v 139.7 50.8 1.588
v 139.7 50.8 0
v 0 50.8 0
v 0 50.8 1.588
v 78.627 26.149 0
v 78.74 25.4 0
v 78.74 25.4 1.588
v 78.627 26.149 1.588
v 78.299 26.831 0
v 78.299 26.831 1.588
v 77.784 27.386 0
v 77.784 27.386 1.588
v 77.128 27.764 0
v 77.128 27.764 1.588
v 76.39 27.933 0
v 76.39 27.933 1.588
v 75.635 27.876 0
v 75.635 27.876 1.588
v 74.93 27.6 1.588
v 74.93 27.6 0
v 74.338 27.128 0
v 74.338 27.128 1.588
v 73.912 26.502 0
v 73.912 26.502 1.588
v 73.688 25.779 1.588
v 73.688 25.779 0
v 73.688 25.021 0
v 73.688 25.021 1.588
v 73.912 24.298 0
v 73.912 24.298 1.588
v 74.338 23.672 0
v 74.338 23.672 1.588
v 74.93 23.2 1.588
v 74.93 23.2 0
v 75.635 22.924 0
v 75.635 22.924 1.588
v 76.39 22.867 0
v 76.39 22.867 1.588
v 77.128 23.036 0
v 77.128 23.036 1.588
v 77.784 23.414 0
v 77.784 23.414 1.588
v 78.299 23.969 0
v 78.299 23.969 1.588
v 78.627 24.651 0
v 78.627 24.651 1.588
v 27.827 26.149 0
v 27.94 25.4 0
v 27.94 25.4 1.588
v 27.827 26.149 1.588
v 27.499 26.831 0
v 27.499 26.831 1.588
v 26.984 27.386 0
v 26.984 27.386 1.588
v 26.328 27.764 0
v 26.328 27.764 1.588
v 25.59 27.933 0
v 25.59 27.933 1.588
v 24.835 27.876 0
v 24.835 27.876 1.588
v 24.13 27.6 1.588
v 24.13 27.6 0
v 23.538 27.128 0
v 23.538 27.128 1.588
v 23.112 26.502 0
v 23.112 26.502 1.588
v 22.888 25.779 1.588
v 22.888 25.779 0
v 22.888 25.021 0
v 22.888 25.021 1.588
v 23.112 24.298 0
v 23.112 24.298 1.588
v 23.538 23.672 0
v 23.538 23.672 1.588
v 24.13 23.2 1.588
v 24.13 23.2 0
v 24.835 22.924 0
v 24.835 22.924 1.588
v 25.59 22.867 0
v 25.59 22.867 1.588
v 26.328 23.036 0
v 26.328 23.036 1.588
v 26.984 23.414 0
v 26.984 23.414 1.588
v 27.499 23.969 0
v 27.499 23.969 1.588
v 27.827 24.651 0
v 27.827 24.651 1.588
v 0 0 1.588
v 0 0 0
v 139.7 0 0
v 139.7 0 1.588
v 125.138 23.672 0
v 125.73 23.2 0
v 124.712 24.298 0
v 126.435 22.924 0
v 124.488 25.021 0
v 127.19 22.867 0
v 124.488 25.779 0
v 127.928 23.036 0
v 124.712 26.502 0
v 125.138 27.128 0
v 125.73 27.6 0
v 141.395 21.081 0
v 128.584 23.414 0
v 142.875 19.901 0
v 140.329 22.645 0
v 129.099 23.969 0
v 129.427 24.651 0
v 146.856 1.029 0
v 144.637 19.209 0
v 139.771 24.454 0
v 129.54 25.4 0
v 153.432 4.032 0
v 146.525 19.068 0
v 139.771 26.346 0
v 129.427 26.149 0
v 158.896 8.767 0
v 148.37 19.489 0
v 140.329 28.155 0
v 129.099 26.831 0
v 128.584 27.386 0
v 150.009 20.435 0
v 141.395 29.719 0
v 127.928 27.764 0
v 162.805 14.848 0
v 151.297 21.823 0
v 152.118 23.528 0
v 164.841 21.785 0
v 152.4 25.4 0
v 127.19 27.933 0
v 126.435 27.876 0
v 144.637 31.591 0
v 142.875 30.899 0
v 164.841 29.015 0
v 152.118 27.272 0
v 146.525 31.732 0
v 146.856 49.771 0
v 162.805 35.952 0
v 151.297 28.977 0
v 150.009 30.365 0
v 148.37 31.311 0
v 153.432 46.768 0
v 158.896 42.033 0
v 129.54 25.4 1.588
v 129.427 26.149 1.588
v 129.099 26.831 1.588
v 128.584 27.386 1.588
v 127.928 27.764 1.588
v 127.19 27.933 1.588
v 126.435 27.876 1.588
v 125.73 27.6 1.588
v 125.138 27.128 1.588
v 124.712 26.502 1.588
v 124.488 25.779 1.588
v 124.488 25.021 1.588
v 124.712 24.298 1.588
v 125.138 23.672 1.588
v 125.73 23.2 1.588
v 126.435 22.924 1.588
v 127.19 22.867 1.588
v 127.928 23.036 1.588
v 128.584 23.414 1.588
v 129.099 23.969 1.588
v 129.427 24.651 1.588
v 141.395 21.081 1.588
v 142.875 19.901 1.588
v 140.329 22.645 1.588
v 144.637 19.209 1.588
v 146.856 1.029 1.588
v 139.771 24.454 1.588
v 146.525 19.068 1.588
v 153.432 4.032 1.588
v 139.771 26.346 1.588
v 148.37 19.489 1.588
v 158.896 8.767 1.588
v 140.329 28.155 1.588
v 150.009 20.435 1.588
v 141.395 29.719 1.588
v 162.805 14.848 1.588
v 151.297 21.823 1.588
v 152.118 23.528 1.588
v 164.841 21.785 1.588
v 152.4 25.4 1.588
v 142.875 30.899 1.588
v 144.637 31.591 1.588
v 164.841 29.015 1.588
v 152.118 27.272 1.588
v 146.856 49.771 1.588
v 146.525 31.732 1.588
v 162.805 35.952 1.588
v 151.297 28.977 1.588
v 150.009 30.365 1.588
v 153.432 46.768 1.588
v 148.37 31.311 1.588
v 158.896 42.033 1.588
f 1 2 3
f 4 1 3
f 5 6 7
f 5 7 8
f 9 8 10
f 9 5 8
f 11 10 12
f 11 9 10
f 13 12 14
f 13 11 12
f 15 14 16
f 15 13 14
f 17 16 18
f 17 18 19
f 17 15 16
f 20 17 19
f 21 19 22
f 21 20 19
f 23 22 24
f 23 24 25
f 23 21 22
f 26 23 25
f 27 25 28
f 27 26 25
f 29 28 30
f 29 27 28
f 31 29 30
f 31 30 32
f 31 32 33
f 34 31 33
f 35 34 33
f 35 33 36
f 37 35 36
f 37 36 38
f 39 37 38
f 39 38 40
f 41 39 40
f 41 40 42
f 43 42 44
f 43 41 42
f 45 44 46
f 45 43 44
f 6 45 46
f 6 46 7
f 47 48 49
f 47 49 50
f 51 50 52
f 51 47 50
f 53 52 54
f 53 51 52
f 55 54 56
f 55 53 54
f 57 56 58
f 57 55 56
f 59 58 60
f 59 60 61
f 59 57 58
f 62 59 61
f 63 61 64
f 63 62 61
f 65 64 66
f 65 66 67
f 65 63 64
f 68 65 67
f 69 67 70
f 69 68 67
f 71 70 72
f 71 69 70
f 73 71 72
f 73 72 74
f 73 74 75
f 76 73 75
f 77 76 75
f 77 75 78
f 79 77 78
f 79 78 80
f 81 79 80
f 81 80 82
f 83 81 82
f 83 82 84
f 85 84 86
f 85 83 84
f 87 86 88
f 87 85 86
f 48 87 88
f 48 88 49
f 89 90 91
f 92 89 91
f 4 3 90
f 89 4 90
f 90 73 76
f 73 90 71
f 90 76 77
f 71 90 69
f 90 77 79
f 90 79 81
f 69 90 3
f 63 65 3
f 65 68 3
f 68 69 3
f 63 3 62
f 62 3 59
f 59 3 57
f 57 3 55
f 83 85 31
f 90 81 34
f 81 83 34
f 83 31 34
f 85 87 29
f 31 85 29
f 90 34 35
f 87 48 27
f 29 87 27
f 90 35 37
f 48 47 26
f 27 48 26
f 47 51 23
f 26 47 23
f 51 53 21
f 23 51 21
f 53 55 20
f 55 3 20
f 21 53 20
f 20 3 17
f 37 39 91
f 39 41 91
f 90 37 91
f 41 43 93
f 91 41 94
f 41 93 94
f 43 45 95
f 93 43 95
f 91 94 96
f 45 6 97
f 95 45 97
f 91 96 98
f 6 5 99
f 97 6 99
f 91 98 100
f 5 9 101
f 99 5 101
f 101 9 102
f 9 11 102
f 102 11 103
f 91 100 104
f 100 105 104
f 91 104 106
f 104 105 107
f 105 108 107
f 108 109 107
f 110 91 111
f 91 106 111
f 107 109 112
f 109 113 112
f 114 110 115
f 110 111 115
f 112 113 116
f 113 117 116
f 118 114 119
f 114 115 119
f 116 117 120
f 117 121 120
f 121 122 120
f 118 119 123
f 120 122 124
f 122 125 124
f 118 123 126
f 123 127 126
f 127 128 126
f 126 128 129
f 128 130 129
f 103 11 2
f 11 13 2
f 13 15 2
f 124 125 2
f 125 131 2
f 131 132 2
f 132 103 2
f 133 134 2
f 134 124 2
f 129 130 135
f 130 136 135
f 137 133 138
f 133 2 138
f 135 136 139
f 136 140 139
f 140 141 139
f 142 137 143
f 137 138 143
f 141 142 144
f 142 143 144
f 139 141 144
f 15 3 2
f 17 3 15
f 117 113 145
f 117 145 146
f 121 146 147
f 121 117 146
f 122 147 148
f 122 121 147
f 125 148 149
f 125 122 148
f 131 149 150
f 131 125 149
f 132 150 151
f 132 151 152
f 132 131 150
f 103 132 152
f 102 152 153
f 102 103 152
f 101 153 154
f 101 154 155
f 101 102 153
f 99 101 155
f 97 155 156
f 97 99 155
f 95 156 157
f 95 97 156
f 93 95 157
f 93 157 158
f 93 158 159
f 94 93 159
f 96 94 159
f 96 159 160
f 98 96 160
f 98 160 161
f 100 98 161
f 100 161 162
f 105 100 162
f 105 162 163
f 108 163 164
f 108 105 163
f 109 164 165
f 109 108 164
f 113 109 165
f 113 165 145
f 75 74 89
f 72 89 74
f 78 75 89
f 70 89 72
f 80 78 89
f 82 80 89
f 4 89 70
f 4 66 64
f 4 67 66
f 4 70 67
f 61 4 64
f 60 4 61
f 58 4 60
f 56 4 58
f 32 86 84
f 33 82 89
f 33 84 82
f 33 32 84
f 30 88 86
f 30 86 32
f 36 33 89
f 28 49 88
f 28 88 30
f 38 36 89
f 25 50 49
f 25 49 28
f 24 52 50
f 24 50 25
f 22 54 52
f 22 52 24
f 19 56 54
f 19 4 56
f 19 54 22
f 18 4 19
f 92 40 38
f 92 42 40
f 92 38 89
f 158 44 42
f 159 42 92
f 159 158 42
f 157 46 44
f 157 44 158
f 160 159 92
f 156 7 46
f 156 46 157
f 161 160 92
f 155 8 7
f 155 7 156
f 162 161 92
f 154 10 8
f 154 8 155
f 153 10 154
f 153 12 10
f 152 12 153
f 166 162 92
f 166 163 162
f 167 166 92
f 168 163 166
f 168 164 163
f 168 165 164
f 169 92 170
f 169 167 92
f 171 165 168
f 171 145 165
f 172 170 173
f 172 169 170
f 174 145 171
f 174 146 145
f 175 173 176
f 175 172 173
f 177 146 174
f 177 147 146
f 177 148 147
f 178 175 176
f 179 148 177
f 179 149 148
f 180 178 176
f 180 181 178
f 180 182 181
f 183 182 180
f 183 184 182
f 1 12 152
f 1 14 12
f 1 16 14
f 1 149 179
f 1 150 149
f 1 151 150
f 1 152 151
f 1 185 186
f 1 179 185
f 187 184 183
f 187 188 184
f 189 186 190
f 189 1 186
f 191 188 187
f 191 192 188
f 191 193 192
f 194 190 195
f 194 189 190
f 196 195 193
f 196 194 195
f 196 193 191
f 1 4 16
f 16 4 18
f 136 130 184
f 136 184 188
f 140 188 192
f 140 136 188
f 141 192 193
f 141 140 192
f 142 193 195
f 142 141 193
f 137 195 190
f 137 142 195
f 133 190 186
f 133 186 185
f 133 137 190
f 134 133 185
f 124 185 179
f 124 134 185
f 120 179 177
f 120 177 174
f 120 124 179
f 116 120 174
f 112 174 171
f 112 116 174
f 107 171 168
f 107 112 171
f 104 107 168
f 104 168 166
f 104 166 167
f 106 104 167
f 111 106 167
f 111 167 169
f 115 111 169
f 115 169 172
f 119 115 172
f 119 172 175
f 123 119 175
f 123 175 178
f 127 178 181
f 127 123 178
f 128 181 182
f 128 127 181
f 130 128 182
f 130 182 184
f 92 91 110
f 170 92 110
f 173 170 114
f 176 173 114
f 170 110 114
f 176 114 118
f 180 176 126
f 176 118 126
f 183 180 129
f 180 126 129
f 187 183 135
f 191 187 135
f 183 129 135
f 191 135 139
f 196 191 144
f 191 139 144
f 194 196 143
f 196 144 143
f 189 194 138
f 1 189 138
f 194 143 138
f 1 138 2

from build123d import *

# Parameters (mm, degrees)
SKETCH1_R           = 6.35
SKETCH1_R_2         = 2.54
BOSS_EXTRUDE1_DEPTH = 1.5875


with BuildPart() as part:
    # Sketch1 → Boss-Extrude1 (new body)
    with BuildSketch(Plane.XY):
        with BuildLine():
            Line((0, 0), (139.7, 0))
            ThreePointArc((139.7, 0), (165.1, 25.4), (139.7, 50.8))
            Line((139.7, 50.8), (0, 50.8))
            Line((0, 50.8), (0, 0))
        make_face()
        with Locations((146.05, 25.4)):
            Circle(SKETCH1_R, mode=Mode.SUBTRACT)
        with Locations((25.4, 25.4)):
            Circle(SKETCH1_R_2, mode=Mode.SUBTRACT)
        with Locations((76.2, 25.4)):
            Circle(SKETCH1_R_2, mode=Mode.SUBTRACT)
        with Locations((127, 25.4)):
            Circle(SKETCH1_R_2, mode=Mode.SUBTRACT)
    extrude(amount=BOSS_EXTRUDE1_DEPTH)


solid = part.part
